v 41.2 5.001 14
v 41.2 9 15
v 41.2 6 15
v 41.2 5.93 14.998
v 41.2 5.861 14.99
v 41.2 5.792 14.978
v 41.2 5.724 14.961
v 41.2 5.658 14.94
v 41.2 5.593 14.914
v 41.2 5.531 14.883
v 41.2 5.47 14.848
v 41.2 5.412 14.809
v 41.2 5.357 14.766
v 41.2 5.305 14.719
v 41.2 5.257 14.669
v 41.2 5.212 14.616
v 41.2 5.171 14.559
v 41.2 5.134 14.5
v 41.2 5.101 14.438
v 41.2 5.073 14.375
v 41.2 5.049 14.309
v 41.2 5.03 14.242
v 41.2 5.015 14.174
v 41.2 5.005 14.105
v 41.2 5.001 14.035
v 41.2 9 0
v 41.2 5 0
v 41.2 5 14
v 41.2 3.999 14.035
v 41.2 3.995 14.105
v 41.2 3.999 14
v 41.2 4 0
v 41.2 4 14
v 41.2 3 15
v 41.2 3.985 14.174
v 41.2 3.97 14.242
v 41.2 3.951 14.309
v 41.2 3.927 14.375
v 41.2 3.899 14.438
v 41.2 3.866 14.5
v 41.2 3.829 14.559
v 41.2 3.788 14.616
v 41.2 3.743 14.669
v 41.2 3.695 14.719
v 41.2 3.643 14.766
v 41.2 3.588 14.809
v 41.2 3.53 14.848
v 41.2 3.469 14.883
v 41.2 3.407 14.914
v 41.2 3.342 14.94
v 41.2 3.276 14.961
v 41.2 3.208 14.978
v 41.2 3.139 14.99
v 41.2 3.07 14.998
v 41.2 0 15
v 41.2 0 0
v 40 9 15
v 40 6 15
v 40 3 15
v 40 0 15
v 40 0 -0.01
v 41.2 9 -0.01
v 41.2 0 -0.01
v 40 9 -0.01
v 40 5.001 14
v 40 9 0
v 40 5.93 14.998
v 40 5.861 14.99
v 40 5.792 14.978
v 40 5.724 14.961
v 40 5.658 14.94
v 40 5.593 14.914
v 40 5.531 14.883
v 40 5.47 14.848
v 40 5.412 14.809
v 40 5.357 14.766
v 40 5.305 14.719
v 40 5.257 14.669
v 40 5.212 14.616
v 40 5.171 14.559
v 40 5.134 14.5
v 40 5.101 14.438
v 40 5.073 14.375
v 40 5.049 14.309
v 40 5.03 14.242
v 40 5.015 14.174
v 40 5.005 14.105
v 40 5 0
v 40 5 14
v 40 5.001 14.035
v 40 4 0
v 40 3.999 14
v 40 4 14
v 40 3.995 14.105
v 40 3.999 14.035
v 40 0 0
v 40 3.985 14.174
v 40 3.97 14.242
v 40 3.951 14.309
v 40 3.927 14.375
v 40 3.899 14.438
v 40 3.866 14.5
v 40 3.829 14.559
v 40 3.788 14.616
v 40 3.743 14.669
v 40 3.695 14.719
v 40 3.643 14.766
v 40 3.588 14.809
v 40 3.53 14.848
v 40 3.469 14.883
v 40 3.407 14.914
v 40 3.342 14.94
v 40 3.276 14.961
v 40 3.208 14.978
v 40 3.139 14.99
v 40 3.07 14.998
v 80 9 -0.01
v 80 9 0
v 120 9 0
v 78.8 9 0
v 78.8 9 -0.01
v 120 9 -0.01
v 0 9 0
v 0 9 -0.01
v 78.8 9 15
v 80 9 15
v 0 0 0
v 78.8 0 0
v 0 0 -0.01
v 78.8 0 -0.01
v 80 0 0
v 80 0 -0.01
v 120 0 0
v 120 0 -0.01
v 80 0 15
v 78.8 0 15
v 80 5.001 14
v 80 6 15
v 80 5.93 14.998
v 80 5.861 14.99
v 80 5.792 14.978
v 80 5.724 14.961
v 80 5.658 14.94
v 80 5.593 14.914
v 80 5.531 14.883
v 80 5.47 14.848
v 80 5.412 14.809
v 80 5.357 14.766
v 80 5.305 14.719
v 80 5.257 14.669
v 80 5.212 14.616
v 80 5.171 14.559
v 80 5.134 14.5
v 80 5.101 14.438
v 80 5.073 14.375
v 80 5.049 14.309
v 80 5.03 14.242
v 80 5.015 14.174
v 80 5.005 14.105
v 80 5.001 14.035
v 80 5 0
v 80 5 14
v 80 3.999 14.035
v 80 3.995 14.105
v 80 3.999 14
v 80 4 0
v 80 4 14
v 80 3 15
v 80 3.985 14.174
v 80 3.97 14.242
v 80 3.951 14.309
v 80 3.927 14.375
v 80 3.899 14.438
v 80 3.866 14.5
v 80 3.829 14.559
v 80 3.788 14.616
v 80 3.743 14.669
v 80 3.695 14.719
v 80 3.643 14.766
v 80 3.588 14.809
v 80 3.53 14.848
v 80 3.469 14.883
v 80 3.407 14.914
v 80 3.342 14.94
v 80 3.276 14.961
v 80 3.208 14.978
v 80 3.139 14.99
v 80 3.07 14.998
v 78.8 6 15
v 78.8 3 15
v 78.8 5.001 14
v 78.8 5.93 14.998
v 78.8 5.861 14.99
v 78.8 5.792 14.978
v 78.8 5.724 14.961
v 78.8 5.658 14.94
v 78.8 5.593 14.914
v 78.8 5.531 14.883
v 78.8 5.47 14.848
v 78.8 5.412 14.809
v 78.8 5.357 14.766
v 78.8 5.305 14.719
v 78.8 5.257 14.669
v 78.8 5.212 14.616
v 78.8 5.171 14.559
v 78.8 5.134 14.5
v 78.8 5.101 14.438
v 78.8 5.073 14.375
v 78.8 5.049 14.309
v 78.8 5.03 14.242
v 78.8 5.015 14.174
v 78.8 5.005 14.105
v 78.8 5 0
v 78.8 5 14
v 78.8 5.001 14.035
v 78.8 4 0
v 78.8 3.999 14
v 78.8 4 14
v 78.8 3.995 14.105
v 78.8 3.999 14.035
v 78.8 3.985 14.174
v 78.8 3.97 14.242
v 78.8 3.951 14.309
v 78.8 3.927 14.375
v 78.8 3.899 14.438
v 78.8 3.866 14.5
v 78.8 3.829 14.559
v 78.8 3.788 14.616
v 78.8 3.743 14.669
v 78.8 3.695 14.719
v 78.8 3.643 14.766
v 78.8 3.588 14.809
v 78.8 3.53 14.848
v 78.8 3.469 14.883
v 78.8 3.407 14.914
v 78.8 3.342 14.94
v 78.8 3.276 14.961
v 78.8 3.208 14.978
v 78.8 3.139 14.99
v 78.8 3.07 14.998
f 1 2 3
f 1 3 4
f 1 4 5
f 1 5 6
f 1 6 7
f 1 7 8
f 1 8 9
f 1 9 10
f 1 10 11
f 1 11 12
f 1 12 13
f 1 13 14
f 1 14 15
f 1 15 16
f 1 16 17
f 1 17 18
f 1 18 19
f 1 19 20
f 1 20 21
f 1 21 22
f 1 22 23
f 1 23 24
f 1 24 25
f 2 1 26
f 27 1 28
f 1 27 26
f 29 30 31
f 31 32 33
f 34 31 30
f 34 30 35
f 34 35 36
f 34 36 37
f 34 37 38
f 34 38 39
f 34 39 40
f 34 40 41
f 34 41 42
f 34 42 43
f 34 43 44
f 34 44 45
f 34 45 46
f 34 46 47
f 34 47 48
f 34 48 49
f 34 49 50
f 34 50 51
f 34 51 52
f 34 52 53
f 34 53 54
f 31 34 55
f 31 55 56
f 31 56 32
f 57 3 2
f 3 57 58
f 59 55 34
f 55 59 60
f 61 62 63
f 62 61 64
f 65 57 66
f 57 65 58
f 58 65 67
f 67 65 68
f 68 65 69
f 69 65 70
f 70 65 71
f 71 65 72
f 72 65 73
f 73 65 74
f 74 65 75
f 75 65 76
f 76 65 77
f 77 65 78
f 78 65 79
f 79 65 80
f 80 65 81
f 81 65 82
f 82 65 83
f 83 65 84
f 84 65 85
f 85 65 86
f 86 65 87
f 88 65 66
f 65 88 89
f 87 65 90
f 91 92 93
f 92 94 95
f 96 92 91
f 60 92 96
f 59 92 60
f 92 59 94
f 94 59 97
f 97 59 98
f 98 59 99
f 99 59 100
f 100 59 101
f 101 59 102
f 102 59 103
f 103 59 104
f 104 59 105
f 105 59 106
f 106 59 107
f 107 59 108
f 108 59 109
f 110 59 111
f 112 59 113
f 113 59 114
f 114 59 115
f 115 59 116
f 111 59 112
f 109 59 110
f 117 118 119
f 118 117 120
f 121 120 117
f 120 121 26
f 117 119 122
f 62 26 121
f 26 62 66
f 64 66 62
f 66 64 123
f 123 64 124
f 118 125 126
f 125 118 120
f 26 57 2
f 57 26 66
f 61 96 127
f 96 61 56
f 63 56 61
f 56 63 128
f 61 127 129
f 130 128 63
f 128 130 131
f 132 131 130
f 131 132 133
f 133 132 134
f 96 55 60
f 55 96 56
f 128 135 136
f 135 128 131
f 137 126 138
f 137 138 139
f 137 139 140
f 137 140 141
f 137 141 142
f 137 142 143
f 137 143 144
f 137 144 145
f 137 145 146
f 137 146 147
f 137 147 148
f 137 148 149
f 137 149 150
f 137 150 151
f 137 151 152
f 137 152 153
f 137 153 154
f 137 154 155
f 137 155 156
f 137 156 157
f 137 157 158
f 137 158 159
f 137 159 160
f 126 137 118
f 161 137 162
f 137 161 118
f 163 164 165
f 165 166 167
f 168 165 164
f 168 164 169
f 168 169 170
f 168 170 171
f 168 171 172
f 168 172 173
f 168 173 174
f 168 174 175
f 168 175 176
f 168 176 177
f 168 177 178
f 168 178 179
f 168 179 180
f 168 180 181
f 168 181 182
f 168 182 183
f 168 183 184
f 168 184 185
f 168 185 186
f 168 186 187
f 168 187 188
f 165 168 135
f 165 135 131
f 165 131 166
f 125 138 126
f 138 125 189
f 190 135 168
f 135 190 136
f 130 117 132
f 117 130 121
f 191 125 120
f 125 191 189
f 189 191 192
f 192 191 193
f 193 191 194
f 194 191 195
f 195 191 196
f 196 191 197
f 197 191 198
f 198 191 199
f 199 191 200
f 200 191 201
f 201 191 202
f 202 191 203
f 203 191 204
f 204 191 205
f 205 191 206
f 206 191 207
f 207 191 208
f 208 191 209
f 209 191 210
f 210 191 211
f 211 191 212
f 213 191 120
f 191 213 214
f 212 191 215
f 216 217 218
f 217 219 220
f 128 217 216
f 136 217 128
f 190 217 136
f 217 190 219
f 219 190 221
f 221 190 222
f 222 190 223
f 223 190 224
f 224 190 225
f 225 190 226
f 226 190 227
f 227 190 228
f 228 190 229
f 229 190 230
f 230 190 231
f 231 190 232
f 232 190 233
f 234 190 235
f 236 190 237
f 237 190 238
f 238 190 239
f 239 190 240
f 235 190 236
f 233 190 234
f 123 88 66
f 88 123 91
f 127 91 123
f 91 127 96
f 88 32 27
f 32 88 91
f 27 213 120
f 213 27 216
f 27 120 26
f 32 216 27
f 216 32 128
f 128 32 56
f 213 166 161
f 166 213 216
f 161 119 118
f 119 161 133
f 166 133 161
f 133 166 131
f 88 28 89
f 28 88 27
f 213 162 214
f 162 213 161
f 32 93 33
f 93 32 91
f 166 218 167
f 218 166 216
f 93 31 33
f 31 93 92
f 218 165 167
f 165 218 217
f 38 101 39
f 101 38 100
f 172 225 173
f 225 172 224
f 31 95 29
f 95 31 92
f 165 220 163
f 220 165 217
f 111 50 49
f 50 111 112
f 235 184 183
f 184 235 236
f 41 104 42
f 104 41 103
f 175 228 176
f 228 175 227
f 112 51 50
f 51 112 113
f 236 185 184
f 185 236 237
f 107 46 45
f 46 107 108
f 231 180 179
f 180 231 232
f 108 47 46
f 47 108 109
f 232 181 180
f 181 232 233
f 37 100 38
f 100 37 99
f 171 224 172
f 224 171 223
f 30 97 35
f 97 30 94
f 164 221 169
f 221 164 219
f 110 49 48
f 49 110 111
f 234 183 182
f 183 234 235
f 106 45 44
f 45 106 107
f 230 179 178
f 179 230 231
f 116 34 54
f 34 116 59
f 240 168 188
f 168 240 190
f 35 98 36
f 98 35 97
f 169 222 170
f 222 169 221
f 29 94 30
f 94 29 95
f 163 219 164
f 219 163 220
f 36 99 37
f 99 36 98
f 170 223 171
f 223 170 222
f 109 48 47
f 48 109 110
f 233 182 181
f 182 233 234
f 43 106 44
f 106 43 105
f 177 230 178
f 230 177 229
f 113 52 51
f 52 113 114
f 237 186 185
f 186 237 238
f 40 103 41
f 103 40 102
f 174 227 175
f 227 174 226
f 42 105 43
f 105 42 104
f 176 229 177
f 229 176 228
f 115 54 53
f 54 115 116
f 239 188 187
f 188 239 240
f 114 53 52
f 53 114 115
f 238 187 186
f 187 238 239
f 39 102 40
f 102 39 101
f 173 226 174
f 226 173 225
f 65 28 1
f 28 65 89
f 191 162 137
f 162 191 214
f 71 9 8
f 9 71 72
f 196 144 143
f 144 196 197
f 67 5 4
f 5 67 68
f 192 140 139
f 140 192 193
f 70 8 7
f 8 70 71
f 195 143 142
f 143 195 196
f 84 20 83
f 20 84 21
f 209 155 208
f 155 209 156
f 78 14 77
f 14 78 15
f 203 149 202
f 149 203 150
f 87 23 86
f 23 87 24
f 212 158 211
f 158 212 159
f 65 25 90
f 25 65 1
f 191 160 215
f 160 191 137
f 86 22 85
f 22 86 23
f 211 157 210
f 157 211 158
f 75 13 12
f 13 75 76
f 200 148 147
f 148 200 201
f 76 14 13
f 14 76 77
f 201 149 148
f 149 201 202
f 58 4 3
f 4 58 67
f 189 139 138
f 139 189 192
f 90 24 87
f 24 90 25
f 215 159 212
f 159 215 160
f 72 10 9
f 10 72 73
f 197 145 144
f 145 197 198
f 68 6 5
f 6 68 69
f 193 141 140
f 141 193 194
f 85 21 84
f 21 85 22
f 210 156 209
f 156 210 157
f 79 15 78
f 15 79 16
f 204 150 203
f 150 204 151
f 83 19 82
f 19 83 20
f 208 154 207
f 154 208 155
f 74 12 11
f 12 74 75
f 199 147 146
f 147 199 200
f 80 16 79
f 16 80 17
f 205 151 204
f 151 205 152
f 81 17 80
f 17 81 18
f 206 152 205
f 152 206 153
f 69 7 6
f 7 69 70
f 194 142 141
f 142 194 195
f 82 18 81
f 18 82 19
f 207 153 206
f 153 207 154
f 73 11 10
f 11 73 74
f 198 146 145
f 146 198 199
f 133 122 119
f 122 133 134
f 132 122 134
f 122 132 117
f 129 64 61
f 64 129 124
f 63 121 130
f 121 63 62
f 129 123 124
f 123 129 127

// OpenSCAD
// file: ../Base/Rotation.scad
// Fischertechnik Box Foundation
// Geometry Helpers Rotation

include <PlacementOptions.scad>

// getRotatedSpace(space, rotation=NoRotation)
// Rotates the space dependent on the specified rotation

function getRotatedSpace(space, rotation=NoRotation) = [
    (rotation == Rotate90 || rotation == Rotate270) ? space.y : space.x,
    (rotation == Rotate90 || rotation == Rotate270) ? space.x : space.y
];

// Rotates the given space around the fixed left lower corner
// space = the space the children needs as width/depth list [width,depth]
// rotation = 0 Rotate0 degrees, 1 Rotate90 degrees, 2 Rotate180 degrees, 3 Rotate270 degrees (equivalent to -90)

module RotateFix(space, rotation=NoRotation) {
    dy = (rotation == Rotate0 || rotation == Rotate270) ? 0 :
        (rotation == Rotate90) ? space.x :
        space.y;
    dx = (rotation < Rotate180) ? 0 :
        (rotation == Rotate180) ? space.x :
        space.y;
    
    translate([dx, dy, 0])
        rotate([0, 0, rotations[rotation]])
            children();
}
// file: ../Base/Alignment.scad
// Fischertechnik Box Foundation
// Geometry Helpers Alignment

include <PlacementOptions.scad>

// getAlignedX(elementWidth, spaceWidth, align=AlignRight, offset=0)
// Gets the aligned X offset of an element with the given
// width in the given space.
// elementWidth = The width of the element to positon
// spaceWidth = The space where the element should be aligned
// align = 0 AlignLeft, 1 AlignCenter, 2 AlignRight
// offset = an optional offset from the aligned position. When
// aligned left or centered, then positive values are in X direction.
// When aligned right then positive values are in negative X direction.

function getAlignedX(elementWidth, spaceWidth, align=AlignRight, offset=0) =
    (align == AlignLeft) ?
        offset :
        ((align == AlignCenter) ?
        (spaceWidth - elementWidth)/2 + offset :
        spaceWidth - offset - elementWidth);

// getAlignedY(elementDepth, spaceDepth, align=AlignTop, offset=0)
// Gets the aligned Y offset of an element with the given
// depth in the given space.
// elementDepth = The depth of the element to positon
// spaceDepth = The space where the element should be aligned
// align = 0 AlignBottom, 1 AlignCenter, 2 AlignTop
// offset = an optional offset from the aligned position. When
// aligned bottom or centered, then positive values are in Y direction.
// When aligned top then positive values are in negative Y direction.

function getAlignedY(elementDepth, spaceDepth, align=AlignTop, offset=0) =
    (align == AlignBottom) ?
        offset :
        ((align == AlignCenter) ?
        (spaceDepth - elementDepth)/2 + offset :
        spaceDepth - offset - elementDepth);
// file: ../Base/PlacementOptions.scad
// Fischertechnik Box Foundation
// Placement Options

// Alignment
NoAlign = 0;
AlignLeft = 1;
AlignBottom = 2;
AlignCenter = 3;
AlignRight = 4;
AlignTop = 5;

// Element rotation degree steps
rotations = [0, -90, -180, -270];

// Rotation
NoRotation = 0;
Rotate0 = 0;
Rotate90 = 1;
Rotate180 = 2;
Rotate270 = 3;

// Docking (seen from above)
NoDock = -1;
DockLeft = 0;
DockTop = 1;
DockRight = 2;
DockCorner = 2;
DockBottom = 3;

// Web corners
LowerLeft = 0;
UpperLeft = 1;
UpperRight = 2;
LowerRight = 3;

// Web position relative to corner
LeftOfCorner = 0;
RightOfCorner = 1;
// file: ../Base/Boxes.scad
// Fischertechnik Box Foundation
// Pre-designed Boxes

use <Constants.scad>

include <PlacementOptions.scad>

box190Width = 190;
box190Depth = 130;
box130Width = 130;
box130Depth = 95;

// Values are from an original ec3 box
topBottomDifference = 1.5;
outerHeight = 40;
baseThickness = 1.8;
innerHeight = outerHeight - baseThickness;
stackExcess = 5.7;
radius = 3.5;
wallThickness = 1.5;
tolerance = 0.2;

boxWallThickness = wallThickness;
boxBaseThickness = baseThickness;
boxWebWidth = 3.0;

// getBoxWallThickness()
// Gets the wall thickness of a Fischertechnik Box
function getBoxWallThickness() = boxWallThickness;

// getBoxUsageHeight(height = 38.2)
// Gets the usable height of a Fischertechnik box
// height = Outer height of the box from the bottom to the upper edge.
function getBoxUsageHeight(height = outerHeight) = height - baseThickness - stackExcess;

// getBoxInnerHeight()
// Gets the inner height of a Fischertechnik box, including the stack excess
function getBoxInnerHeight() = innerHeight;

// getBoxBaseThickness()
// Gets the thickness of the Fischertechnik box base.
function getBoxBaseThickness() = boxBaseThickness;

// getBoxWebWidth()
// Gets the width of a box web
function getBoxWebWidth() = boxWebWidth;

// getBox190Space()
// Gets the usable inner space of a Box 190 as an x/y-list
function getBox190Space() = [
    box190Width - 2*getBoxWallThickness() - topBottomDifference, 
    box190Depth - 2*getBoxWallThickness() - topBottomDifference ];

// RoundedCornerPlate(width, depth, height, radius)
// Creates a body plate with rounded corners for a box. Used
// also to create the complete box with the hull module.
// width = Width of the plate
// depth = depth of the plate 
// height = thickness of the plate
// radius = radius of the rounded corner
module RoundedCornerPlate(width, depth, height, radius) {
    translate([radius, radius])
    hull() {
        w = width-2*radius;
        d = depth-2*radius;
        cube([w, d, height]);
        cylinder(height, r=radius, $fn=getFragments());
        translate([w, 0])
            cylinder(height, r=radius, $fn=getFragments());
        translate([w, d])
            cylinder(height, r=radius, $fn=getFragments());
        translate([0, d])
            cylinder(height, r=radius, $fn=getFragments());
    }
}

// BoxBase(width, depth)
// Creates an empty stackable Fischertechnik compatible box
// width = Outer width of the box (190, 130, ...)
// depth = Outer depth of the box (130, 95, ...)

module BoxBase(width, depth, height=outerHeight) {    
    thinPlate = 0.01;

    innerHeight = height - baseThickness;    
    
    module Body(tolerance=tolerance) {
        hull() {
            // Bottom with tolerance to fit into the original boxes when stacked
            translate([-wallThickness+tolerance, -wallThickness+tolerance, -baseThickness])
                RoundedCornerPlate(width-topBottomDifference-2*tolerance, depth-topBottomDifference-2*tolerance, thinPlate, radius);
            
            // Top
            translate([-wallThickness-topBottomDifference/2, -wallThickness-topBottomDifference/2, innerHeight-thinPlate])
                RoundedCornerPlate(width, depth, thinPlate, radius);
         }
    }

    module Cutoff() {
        hull() {
            coWidth = width - 2*wallThickness;
            coDepth = depth - 2*wallThickness;
            
            // Bottom
            RoundedCornerPlate(coWidth-topBottomDifference, coDepth-topBottomDifference, thinPlate, radius);

            // Top
            translate([-topBottomDifference/2, -topBottomDifference/2, innerHeight+thinPlate]) 
                RoundedCornerPlate(coWidth, coDepth, thinPlate, radius);
        }
    }
    
    difference() {        
        Body();
        Cutoff();
        stackOffset = innerHeight - stackExcess;
        translate([0, 0, stackOffset + baseThickness])
            Body(tolerance=0);
    }
}

// Creates the Fischertechnik empty box 130x190 mm and places it at position 0,0
// 190x130 are the outer sizes, the inner space is slightly smaller. Use getBox190Space() to get the inner sizes.
// The box is positioned that the usable inner space is at the 0,0,0 position.

module Box190() {
    BoxBase(box190Width, box190Depth);
}

// Gets the usable inner space of a Box 130 as an x/y-list
function getBox130Space() = [
    box130Width - 2*getBoxWallThickness() - topBottomDifference, 
    box130Depth - 2*getBoxWallThickness() - topBottomDifference ];

// Creates the Fischertechnik empty box 95x130 mm and places it at position 0,0
// 190x130 are the outer sizes, the inner space is slightly smaller. Use getBox190Space() to get the inner sizes.
// The box is positioned that the usable inner space is at the 0,0,0 position.

module Box130() {
    BoxBase(box130Width, box130Depth);
}

// Creates a web at the specified box walls
// corner 0 = LowerLeft, 1 = UpperLeft, 2 = UpperRight, 3 = LowerRight
// side 0 = LeftOfCorner, 1 = RightOfCorner
// distance = Distance in mm from the corner
// boxSpace = inner width and depth of the box (default: Box 190)
// webWidth = length of the web (default is 3 mms)
// webThickness = thickness of the web (default is 1 mm)
// height = Height of the web (standard is getBoxUsageHeight())
// sink = How much of the web is sunk into the wall

module BoxWeb(
    corner, 
    side, 
    distance, 
    boxSpace=getBox190Space(), 
    webWidth=getBoxWebWidth(), 
    webThickness=1.0, 
    height=getBoxUsageHeight(),
    sink = getBoxWallThickness()/2) {
    width = (corner % 2 == 0) ? 
            (side == LeftOfCorner ? webWidth : webThickness) :
            (side == LeftOfCorner ? webThickness : webWidth);

    depth = (corner % 2 == 0) ? 
            (side == RightOfCorner ? webWidth : webThickness) :
            (side == RightOfCorner ? webThickness : webWidth);
    
    xDiff = corner == LowerLeft ? 
                (side == LeftOfCorner ? -sink : distance) :
            (corner == UpperLeft ?                
                (side == LeftOfCorner ? distance : -sink) :
            (corner == UpperRight ?
                (side == LeftOfCorner ? boxSpace.x-webWidth+sink : boxSpace.x-distance-webThickness) :
                (side == LeftOfCorner ? boxSpace.x-distance-webThickness: boxSpace.x-webWidth+sink)));

    yDiff = corner == LowerLeft ? 
                (side == RightOfCorner ? -sink : distance) :
            (corner == UpperLeft ?
                (side == RightOfCorner ? boxSpace.y-distance-webThickness : boxSpace.y-webWidth+sink) :
            (corner == UpperRight ?
                (side == RightOfCorner ? boxSpace.y-webWidth+sink : boxSpace.y-distance-webThickness) :
                (side == RightOfCorner ? distance : -sink)));
    
    translate([xDiff, yDiff, -getExcess()])
        cube([width, depth, height + 2*getExcess()]);
}
// file: ../Base/Placement.scad
// Fischertechnik Box Foundation
// Geometry Helpers Placement

use <Constants.scad>
use <Alignment.scad>
use <Rotation.scad>
use <Boxes.scad>

include <PlacementOptions.scad>

// Place(x=0, y=0, elementSpace=[0,0], alignX=AlignLeft, alignY=AlignBottom, rotation=Rotate0, boxSpace=getBox190Space())
// Places the child at the specified position
// y = Y-Position. This is a relative position when an X aligment is specified.
// x = X-Position. This is a relative position when an Y aligment is specified.
// elementSpace = space of the element to be placed [x,y]
// alignX = -1=NoAlign, 0 AlignLeft, 1 AlignCenter, 3 AlignRight (elementSpace and boxSpace required!)
// alignY = -1=NoAlign, 2 AlignBottom, 1 AlignCenter, 4 AlignTop (elementSpace and boxSpace required!)
// rotation = 0 Rotate0 0 degrees, 1 Rotate90 90 degrees, 
// 2 Rotate180 180 degrees, 3 Rotate270 270 degrees (equivalent to -90)
// boxSpace = Inner space of the box where the placement occurs [x,y] - default is Box 190x130 inner space

module Place(x=0, y=0, elementSpace=[0,0], 
  alignX=AlignLeft, alignY=AlignBottom, 
  rotation=NoRotation, boxSpace=getBox190Space()) {

    module Position(x, y, space, rotation=Rotate0) {
        translate([x, y, 0])
            RotateFix(space, rotation)
                children();
    }

    space = getRotatedSpace(elementSpace, rotation);
    alignedX = getAlignedX(space.x, boxSpace.x, alignX, x);
    alignedY = getAlignedY(space.y, boxSpace.y, alignY, y);
    Position(alignedX, alignedY, elementSpace, rotation)
        children();
}

// Center(space=getBox130Space(), elementSpace=[0,0])
// space = Space where the children is centered. For cylinder use centered=true and no elementSpace.
// elementSpace = space of the element to be centered [x,y]

module Center(space=getBox190Space(), elementSpace=[0,0]) {
    Place(elementSpace=elementSpace, boxSpace=space, alignX=AlignCenter, alignY=AlignCenter)
        children();
}

// CenterHorizontal(width=0, y=0, offset=0, space=getBox130Space())
// width = Width of the element to be placed.
// y = Y position of the element
// offset = Offset from the center position (negative will be left of the center)
// space = Space where the element is placed

module CenterHorizontal(width=0, y=0, offset=0, space=getBox190Space()) {
    Place(x=offset, y=y, elementSpace=[width, 0], boxSpace=space, alignX=AlignCenter)
        children(0);
}

// CenterVertical(depth=0, x=0, offset=0, space=getBox130Space())
// depth = Depth of the element to be placed.
// x = X position of the element
// offset = Offset from the center position (negative will be down of the center)
// space = Space where the element is placed

module CenterVertical(depth=0, x=0, offset=0, space=getBox190Space()) {
    Place(x=x, y=offset, elementSpace=[0, depth], boxSpace=space, alignY=AlignCenter)
        children(0);
}

// getIsVertical(align)
// True if the specified alignment needs a vertical orientation for a divider (AlignRight, AlignLeft)

function getIsVertical(align) = (align == AlignRight || align == AlignLeft);

// getIsHorizontal(align)
// True if the specified alignment needs a horizontal orientation for a divider (AlignTop, AlignBottom)

function getIsHorizontal(align) = (align == AlignTop || align == AlignBottom);
// file: ../Base/Constants.scad
// Fischertechnik Box Foundation
// Constants

// Constant values necessary for multiple elements

// Base constants
dividerThickness = 1.2;
excess = 0.01;
fragments = 90;
tolerance = 0.8;

// Gets the thickness of a divider 
function getDividerThickness() = dividerThickness;

// Gets the excess that is used to merge walls into each other
function getExcess() = excess;

// Gets amount of fragments of a cylinder
function getFragments() = fragments;

// Gets the inner tolerance of a frame to each side
function getTolerance() = tolerance;


// Fischertechnik specific constants
axisDiameter = 4;
axisBottomDiameter = axisDiameter + 1;
axisTolerance = 0.2;

// Gets axis diameter of Fischertechnik axis
function getAxisDiameter() = axisDiameter;

// Gets axis diameter tolerance (subtracted for element axis)
function getAxisTolerance() = axisTolerance;

// Gets the axis diameter for standing axis
function getStandAxisDiameter() = getAxisDiameter() - getAxisTolerance();

// Gets axis bottom diameter for thicker part at the bottom
function getAxisBottomDiameter() = axisBottomDiameter;

pinHeight = 2.5;

// gets the height of a connecting pin
function getPinHeight() = pinHeight;

standardEdgeDistance = 2.5;
standardWebDistance = 11.5;
standardCornerLength = 15;

// gets the standard distance to the wall of the box for dockable frames with webs
function getStandardEdgeDistance() = standardEdgeDistance;

// gets the standard distance of each web to the corner of the dockable frame
function getStandardWebDistance() = standardWebDistance;

// gets the standard length of the corner walls of a dockable frame
function getStandardCornerLength() = standardCornerLength;

tubeWallFactor = 0.8;

// gets the wall thickness of a tube.
function getTubeWallThickness() = tubeWallFactor * getDividerThickness();

smallPartsFrameHeight = 20;

// gets the frame height for docked small parts boxes.
function getSmallPartsFrameHeight() = smallPartsFrameHeight;

hubRingDiameter = 19.5;
hubRingLevelDiameter = 21;

// gets the diameter of a tube matching the inner ring of a wheel
function getHubRingDiameter() = hubRingDiameter;

// gets the diameter of a hub tube with a thicker diameter
function getHubRingLevelDiameter() = hubRingLevelDiameter;
// main file
// Fischertechnik Box Library
// Holder for mirror band
// 31370

use <../Base/Constants.scad>
use <../ModelBase/Simple.scad>

/* [Hidden] */
width = 120;
depth = 9;
height = 15;

// getHolderMirrorBandSpace()
// Gets the space the nirror band holder needs for width and depth (.x and .y as a list)

function getHolderMirrorBandSpace() = [width, depth, height];

// HolderMirrorBand(xLeft=-1, xRight=-1)
// Holder for the mirror band from the ec3
// xLeft = X-Offset of the first holder from the left edge (-1 for default 40)
// xRight = X-Offset of the second holder from the right edge (-1 for default 40)

module HolderMirrorBand(xLeft=-1, xRight=-1) {
    
    gap = 1;
    radius = 1;
    gapY = (getHolderMirrorBandSpace().y - gap)/2;
    
    Space(getHolderMirrorBandSpace());

    module RoundCorner(yOffset=0, excess=0) {
        translate([0, gapY-radius+2*yOffset, height - radius*1.5])
        rotate([0, 90, 0]) {
            difference() {
                translate([-getExcess()-radius*1.5, -excess])
                    cube([radius+getExcess(), radius+getExcess(), width]);
                translate([-radius/2, yOffset])
                    cylinder(width + 1, radius, $fn=getFragments());
            }
        }
    }

    difference() {
        difference() {
            pos1 = xLeft==-1 ? width / 3 : xLeft;
            pos2 = width - (xRight==-1 ? width / 3 : xRight) - getDividerThickness();
            
            translate([0, 0, -getExcess()]) {
                translate([pos1, 0])
                    cube([getDividerThickness(), getHolderMirrorBandSpace().y, height + getExcess()]);
                translate([pos2, 0])
                    cube([getDividerThickness(), getHolderMirrorBandSpace().y, height + getExcess()]);
            }
            translate([0, gapY])
                cube([width, gap, height+1]);
        }
        
        RoundCorner();
        RoundCorner(radius, getExcess());
    }
    
}

// Tests
color("lightgray") {
HolderMirrorBand();
}
